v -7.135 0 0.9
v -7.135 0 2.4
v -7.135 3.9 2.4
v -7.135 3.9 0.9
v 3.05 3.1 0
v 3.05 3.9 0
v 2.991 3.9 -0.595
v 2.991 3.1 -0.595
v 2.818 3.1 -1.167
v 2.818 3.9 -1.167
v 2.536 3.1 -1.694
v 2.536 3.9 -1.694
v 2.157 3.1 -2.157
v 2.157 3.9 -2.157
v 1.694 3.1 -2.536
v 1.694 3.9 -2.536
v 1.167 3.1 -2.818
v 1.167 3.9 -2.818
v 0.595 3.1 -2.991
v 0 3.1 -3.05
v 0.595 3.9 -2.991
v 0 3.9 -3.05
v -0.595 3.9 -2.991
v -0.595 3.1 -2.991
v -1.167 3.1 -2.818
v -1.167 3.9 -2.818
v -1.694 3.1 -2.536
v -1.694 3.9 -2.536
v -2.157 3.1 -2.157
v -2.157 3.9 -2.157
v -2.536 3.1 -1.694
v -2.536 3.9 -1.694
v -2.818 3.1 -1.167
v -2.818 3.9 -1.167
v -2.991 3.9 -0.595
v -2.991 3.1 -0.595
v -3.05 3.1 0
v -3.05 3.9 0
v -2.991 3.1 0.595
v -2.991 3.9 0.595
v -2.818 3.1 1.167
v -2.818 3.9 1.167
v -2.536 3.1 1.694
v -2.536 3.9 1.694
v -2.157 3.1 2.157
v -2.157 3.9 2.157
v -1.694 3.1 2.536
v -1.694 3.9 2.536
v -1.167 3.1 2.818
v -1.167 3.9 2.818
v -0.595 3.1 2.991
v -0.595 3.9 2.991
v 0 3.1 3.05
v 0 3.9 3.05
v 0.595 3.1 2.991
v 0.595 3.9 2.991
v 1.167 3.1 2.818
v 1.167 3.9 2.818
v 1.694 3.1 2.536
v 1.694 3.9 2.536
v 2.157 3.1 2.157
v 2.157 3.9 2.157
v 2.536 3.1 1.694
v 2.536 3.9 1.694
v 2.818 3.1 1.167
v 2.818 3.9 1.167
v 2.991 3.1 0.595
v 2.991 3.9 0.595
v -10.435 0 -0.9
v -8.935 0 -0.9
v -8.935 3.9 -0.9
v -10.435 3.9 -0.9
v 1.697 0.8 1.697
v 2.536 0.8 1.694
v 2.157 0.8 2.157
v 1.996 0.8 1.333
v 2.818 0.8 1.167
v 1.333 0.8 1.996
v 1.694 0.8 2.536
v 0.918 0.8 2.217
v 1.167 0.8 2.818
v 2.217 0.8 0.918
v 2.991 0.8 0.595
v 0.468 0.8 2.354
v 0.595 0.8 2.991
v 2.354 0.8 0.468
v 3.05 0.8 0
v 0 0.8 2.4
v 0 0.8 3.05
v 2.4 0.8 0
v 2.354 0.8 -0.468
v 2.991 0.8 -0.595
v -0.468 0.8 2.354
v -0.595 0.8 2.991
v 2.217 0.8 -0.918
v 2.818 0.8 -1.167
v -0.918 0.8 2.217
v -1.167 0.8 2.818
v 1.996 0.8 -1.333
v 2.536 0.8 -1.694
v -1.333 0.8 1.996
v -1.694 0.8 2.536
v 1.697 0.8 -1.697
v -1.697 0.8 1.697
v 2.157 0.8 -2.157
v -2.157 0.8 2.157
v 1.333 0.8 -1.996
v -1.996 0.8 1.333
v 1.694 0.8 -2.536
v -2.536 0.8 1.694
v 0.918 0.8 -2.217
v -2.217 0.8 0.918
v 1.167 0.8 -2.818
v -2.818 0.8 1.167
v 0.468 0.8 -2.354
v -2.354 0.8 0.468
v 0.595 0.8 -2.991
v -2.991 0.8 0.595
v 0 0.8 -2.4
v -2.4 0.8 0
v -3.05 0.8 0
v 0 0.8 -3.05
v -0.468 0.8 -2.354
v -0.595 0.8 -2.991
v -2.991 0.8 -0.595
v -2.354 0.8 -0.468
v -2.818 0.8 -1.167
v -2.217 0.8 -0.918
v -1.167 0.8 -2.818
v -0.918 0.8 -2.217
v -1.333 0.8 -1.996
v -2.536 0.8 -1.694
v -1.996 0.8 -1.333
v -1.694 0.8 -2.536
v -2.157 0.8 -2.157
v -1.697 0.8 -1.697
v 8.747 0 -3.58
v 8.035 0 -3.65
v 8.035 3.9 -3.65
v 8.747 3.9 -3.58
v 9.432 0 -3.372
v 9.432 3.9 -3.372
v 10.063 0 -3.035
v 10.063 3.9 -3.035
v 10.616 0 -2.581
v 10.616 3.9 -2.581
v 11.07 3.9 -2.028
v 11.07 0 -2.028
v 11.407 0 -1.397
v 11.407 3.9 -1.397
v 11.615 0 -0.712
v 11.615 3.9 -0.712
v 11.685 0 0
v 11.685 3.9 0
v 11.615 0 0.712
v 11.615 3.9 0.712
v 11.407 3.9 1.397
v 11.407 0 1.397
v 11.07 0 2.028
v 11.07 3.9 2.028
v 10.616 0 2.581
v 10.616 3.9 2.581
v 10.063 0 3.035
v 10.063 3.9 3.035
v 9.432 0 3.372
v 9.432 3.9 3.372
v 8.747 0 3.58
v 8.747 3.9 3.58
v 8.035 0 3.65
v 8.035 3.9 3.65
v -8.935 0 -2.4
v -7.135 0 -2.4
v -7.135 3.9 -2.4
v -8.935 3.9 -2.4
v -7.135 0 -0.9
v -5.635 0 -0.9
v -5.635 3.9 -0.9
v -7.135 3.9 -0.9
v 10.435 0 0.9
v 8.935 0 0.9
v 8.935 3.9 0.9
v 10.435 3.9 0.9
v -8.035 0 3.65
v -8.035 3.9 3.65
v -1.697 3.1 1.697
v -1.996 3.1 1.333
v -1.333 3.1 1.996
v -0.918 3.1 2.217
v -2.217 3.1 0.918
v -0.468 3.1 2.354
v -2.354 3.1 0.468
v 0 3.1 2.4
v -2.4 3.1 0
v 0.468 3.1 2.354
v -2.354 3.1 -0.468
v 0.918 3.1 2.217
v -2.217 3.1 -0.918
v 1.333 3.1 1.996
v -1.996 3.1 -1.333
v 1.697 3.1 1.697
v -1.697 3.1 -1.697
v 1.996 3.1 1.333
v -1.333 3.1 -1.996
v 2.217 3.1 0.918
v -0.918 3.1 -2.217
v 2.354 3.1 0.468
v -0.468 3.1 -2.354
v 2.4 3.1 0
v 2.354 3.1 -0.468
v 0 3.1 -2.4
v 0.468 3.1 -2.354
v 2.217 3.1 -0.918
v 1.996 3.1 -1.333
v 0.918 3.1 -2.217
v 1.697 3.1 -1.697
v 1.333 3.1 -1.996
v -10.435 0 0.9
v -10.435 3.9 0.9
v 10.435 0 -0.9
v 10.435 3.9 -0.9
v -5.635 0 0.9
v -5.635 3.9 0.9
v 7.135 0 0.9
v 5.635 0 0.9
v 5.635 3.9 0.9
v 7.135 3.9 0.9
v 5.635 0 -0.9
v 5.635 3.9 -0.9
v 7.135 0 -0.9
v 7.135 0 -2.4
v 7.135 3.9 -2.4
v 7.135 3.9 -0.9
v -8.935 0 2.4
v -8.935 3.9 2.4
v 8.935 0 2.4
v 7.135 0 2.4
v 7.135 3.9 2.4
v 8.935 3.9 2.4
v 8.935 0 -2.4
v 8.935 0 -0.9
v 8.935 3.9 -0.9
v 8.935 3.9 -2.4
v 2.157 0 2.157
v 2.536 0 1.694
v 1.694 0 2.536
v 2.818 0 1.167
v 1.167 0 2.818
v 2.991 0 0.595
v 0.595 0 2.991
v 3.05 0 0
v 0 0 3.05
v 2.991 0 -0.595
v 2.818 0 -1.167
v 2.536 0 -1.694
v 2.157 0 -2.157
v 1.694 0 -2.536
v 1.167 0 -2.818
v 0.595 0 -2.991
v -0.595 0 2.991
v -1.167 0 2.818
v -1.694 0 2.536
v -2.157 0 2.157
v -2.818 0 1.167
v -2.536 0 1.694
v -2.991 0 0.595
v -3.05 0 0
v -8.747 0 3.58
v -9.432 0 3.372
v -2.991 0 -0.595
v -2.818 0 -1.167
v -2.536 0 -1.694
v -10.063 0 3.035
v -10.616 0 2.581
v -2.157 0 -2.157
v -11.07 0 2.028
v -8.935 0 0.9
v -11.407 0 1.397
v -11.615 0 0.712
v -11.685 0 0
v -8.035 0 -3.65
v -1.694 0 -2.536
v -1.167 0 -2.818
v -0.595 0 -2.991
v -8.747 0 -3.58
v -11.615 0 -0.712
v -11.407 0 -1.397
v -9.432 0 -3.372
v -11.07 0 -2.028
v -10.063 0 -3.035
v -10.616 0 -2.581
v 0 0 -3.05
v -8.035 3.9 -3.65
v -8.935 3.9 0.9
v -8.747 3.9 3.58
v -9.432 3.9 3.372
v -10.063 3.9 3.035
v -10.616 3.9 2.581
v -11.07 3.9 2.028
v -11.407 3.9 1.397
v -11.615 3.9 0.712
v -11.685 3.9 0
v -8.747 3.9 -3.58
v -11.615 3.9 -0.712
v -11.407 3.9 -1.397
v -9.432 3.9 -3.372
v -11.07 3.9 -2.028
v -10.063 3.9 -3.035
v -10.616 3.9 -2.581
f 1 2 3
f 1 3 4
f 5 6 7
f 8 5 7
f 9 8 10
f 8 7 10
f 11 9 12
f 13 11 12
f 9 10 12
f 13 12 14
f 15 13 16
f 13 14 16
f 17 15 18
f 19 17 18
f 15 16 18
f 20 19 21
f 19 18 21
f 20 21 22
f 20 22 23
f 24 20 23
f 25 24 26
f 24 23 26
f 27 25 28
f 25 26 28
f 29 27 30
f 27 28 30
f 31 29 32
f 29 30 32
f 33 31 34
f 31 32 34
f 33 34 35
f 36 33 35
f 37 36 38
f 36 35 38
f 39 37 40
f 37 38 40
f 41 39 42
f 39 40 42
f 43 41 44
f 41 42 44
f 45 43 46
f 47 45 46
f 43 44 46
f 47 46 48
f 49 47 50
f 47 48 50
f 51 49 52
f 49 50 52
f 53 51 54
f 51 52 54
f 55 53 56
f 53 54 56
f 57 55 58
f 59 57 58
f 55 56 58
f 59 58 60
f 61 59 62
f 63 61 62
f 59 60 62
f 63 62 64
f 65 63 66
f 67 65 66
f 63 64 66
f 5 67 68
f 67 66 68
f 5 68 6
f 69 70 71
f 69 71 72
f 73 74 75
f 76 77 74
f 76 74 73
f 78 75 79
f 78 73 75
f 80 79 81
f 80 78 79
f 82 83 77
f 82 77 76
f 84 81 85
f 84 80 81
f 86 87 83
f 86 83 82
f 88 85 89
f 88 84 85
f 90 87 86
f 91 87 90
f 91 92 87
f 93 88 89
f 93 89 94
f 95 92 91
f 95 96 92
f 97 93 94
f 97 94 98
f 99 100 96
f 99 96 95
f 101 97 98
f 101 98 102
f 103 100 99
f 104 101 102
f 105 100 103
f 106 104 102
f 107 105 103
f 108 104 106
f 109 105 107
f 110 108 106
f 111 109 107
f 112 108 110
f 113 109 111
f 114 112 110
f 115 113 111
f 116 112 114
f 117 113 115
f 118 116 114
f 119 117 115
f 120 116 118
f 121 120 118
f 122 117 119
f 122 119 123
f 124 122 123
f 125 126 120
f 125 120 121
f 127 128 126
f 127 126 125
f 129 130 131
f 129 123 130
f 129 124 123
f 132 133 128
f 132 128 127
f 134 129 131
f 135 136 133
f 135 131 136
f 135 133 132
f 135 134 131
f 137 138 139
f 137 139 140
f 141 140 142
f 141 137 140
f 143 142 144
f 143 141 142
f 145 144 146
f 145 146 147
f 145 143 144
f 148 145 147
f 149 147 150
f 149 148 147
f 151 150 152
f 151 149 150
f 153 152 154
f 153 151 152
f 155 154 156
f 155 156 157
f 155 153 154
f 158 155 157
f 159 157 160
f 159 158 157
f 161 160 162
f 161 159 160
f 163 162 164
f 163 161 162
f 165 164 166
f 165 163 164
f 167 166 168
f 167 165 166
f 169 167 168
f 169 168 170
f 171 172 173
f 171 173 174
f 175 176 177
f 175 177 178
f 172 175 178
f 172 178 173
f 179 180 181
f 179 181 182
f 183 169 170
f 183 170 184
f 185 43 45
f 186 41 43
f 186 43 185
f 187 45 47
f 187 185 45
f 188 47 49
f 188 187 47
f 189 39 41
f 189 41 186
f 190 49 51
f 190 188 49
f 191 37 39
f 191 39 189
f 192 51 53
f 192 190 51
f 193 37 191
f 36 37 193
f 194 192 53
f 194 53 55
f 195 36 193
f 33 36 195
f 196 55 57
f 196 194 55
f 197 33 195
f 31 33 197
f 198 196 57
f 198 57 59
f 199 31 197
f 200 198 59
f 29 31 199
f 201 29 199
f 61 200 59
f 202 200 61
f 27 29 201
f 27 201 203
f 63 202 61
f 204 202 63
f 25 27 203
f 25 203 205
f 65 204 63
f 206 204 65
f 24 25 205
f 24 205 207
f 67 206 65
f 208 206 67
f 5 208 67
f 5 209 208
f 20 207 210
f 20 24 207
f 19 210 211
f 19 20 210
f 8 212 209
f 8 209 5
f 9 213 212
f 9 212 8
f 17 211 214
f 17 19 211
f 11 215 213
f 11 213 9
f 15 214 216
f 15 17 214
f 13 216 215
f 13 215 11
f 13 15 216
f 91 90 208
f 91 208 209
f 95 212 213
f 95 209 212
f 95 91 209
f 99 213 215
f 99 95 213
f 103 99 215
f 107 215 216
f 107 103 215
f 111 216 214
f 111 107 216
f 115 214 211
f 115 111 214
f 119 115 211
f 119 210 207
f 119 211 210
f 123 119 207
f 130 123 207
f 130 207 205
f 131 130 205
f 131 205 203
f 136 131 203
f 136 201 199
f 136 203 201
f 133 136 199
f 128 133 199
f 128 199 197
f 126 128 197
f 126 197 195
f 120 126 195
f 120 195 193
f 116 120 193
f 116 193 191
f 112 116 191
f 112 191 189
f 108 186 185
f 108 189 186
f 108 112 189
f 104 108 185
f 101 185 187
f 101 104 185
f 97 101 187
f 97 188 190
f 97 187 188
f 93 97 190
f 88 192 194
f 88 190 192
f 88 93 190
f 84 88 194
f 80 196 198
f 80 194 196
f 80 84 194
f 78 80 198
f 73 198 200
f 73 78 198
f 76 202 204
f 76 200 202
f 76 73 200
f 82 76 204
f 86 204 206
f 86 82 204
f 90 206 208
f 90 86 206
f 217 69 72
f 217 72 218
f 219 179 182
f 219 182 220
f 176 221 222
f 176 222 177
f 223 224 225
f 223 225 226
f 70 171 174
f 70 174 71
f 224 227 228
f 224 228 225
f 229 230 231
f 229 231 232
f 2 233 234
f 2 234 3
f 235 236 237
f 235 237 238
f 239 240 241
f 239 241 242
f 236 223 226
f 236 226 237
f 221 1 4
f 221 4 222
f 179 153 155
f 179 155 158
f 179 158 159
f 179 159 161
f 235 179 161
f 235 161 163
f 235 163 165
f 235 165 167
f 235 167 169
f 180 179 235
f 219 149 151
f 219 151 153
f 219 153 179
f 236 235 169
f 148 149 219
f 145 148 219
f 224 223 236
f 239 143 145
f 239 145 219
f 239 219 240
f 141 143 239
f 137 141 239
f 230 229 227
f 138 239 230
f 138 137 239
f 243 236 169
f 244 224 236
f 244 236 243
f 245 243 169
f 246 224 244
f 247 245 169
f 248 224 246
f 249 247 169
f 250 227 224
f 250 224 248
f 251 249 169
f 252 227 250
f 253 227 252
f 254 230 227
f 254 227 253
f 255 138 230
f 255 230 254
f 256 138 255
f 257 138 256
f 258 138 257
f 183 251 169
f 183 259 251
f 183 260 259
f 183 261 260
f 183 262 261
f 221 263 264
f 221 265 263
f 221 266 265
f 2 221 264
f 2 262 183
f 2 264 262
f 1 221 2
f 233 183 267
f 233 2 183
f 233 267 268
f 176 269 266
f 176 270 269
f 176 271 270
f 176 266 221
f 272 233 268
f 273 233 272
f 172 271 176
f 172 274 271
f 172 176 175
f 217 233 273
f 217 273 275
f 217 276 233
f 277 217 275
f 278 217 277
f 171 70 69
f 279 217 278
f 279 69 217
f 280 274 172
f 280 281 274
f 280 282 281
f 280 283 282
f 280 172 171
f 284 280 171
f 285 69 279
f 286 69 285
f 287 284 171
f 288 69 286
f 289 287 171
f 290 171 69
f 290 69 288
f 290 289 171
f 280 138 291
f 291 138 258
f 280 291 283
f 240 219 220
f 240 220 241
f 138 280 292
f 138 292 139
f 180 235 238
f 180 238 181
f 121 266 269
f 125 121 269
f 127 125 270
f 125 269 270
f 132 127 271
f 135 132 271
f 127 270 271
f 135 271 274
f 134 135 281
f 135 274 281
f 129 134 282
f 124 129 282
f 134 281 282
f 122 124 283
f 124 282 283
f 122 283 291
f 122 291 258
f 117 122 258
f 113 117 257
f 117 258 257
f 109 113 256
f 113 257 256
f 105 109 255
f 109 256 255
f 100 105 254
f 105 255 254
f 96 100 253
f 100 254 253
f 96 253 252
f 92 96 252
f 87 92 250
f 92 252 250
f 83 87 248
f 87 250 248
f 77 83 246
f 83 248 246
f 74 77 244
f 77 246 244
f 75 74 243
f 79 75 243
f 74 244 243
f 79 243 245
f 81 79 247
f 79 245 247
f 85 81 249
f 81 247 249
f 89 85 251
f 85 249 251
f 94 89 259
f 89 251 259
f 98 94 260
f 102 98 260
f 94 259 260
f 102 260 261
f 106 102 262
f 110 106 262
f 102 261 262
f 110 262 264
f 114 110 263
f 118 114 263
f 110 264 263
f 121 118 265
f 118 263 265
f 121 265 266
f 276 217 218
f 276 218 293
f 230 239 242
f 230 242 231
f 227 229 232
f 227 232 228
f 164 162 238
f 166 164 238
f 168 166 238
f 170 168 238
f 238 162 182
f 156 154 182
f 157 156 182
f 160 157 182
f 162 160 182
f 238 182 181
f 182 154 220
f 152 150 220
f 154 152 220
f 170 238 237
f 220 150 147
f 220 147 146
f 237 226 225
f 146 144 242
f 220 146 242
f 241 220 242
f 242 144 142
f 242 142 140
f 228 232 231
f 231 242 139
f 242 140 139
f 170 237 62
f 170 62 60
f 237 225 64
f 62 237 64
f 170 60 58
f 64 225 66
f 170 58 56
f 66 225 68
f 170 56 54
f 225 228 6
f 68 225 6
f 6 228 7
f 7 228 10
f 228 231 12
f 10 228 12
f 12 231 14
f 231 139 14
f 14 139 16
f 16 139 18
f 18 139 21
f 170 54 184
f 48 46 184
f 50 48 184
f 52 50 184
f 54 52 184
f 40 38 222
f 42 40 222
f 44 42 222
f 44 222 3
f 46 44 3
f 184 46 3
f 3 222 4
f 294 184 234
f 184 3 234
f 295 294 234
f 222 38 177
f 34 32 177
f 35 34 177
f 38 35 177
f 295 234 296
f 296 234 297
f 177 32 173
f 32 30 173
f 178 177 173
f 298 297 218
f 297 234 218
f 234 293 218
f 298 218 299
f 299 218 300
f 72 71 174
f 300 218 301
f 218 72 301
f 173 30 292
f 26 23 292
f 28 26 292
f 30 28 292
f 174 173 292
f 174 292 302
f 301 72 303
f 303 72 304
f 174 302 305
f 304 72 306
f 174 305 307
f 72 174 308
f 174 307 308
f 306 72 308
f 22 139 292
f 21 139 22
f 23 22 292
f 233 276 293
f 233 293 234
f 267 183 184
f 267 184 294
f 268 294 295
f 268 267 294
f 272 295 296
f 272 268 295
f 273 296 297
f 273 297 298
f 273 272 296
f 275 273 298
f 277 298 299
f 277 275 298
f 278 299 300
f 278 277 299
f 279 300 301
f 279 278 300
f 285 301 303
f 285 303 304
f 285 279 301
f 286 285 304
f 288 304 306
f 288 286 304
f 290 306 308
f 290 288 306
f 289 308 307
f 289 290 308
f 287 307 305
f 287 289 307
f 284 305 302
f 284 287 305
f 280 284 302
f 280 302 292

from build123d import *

# Parameters (mm, degrees)
SKETCH1_R           = 2.4
BOSS_EXTRUDE1_DEPTH = 3.9
SKETCH2_R           = 3.05
CUT_EXTRUDE1_DEPTH  = 0.8
SKETCH3_R           = 3.05
CUT_EXTRUDE2_DEPTH  = 0.8


with BuildPart() as part:
    # Sketch1 → Boss-Extrude1 (new body)
    with BuildSketch(Plane(origin=(0, 0, 0), x_dir=(1, 0, 0), z_dir=(0, 1, 0))):
        with BuildLine():
            Line((-8.035, 3.65), (8.035, 3.65))
            ThreePointArc((8.035, 3.65), (11.685, 0), (8.035, -3.65))
            Line((8.035, -3.65), (-8.035, -3.65))
            ThreePointArc((-8.035, -3.65), (-11.685, 0), (-8.035, 3.65))
        make_face()
        Circle(SKETCH1_R, mode=Mode.SUBTRACT)
        Polygon((7.135, 2.4), (7.135, 0.9), (5.635, 0.9), (5.635, -0.9), (7.135, -0.9), (7.135, -2.4), (8.935, -2.4), (8.935, -0.9), (10.435, -0.9), (10.435, 0.9), (8.935, 0.9), (8.935, 2.4), align=None, mode=Mode.SUBTRACT)
        Polygon((-8.934958517, 2.400106294), (-8.934958517, 0.900106294), (-10.434958517, 0.900106294), (-10.434958517, -0.899893706), (-8.934958517, -0.899893706), (-8.934958517, -2.399893706), (-7.134958517, -2.399893706), (-7.134958517, -0.899893706), (-5.634958517, -0.899893706), (-5.634958517, 0.900106294), (-7.134958517, 0.900106294), (-7.134958517, 2.400106294), align=None, mode=Mode.SUBTRACT)
    extrude(amount=BOSS_EXTRUDE1_DEPTH)

    # Sketch2 → Cut-Extrude1 (cut)
    with BuildSketch(Plane(origin=(0, 3.9, 0), x_dir=(1, 0, 0), z_dir=(0, 1, 0))):
        Circle(SKETCH2_R)
    extrude(amount=-CUT_EXTRUDE1_DEPTH, mode=Mode.SUBTRACT)

    # Sketch3 → Cut-Extrude2 (cut)
    with BuildSketch(Plane(origin=(0, 0, 0), x_dir=(-1, 0, 0), z_dir=(0, -1, 0))):
        Circle(SKETCH3_R)
    extrude(amount=-CUT_EXTRUDE2_DEPTH, mode=Mode.SUBTRACT)


solid = part.part
